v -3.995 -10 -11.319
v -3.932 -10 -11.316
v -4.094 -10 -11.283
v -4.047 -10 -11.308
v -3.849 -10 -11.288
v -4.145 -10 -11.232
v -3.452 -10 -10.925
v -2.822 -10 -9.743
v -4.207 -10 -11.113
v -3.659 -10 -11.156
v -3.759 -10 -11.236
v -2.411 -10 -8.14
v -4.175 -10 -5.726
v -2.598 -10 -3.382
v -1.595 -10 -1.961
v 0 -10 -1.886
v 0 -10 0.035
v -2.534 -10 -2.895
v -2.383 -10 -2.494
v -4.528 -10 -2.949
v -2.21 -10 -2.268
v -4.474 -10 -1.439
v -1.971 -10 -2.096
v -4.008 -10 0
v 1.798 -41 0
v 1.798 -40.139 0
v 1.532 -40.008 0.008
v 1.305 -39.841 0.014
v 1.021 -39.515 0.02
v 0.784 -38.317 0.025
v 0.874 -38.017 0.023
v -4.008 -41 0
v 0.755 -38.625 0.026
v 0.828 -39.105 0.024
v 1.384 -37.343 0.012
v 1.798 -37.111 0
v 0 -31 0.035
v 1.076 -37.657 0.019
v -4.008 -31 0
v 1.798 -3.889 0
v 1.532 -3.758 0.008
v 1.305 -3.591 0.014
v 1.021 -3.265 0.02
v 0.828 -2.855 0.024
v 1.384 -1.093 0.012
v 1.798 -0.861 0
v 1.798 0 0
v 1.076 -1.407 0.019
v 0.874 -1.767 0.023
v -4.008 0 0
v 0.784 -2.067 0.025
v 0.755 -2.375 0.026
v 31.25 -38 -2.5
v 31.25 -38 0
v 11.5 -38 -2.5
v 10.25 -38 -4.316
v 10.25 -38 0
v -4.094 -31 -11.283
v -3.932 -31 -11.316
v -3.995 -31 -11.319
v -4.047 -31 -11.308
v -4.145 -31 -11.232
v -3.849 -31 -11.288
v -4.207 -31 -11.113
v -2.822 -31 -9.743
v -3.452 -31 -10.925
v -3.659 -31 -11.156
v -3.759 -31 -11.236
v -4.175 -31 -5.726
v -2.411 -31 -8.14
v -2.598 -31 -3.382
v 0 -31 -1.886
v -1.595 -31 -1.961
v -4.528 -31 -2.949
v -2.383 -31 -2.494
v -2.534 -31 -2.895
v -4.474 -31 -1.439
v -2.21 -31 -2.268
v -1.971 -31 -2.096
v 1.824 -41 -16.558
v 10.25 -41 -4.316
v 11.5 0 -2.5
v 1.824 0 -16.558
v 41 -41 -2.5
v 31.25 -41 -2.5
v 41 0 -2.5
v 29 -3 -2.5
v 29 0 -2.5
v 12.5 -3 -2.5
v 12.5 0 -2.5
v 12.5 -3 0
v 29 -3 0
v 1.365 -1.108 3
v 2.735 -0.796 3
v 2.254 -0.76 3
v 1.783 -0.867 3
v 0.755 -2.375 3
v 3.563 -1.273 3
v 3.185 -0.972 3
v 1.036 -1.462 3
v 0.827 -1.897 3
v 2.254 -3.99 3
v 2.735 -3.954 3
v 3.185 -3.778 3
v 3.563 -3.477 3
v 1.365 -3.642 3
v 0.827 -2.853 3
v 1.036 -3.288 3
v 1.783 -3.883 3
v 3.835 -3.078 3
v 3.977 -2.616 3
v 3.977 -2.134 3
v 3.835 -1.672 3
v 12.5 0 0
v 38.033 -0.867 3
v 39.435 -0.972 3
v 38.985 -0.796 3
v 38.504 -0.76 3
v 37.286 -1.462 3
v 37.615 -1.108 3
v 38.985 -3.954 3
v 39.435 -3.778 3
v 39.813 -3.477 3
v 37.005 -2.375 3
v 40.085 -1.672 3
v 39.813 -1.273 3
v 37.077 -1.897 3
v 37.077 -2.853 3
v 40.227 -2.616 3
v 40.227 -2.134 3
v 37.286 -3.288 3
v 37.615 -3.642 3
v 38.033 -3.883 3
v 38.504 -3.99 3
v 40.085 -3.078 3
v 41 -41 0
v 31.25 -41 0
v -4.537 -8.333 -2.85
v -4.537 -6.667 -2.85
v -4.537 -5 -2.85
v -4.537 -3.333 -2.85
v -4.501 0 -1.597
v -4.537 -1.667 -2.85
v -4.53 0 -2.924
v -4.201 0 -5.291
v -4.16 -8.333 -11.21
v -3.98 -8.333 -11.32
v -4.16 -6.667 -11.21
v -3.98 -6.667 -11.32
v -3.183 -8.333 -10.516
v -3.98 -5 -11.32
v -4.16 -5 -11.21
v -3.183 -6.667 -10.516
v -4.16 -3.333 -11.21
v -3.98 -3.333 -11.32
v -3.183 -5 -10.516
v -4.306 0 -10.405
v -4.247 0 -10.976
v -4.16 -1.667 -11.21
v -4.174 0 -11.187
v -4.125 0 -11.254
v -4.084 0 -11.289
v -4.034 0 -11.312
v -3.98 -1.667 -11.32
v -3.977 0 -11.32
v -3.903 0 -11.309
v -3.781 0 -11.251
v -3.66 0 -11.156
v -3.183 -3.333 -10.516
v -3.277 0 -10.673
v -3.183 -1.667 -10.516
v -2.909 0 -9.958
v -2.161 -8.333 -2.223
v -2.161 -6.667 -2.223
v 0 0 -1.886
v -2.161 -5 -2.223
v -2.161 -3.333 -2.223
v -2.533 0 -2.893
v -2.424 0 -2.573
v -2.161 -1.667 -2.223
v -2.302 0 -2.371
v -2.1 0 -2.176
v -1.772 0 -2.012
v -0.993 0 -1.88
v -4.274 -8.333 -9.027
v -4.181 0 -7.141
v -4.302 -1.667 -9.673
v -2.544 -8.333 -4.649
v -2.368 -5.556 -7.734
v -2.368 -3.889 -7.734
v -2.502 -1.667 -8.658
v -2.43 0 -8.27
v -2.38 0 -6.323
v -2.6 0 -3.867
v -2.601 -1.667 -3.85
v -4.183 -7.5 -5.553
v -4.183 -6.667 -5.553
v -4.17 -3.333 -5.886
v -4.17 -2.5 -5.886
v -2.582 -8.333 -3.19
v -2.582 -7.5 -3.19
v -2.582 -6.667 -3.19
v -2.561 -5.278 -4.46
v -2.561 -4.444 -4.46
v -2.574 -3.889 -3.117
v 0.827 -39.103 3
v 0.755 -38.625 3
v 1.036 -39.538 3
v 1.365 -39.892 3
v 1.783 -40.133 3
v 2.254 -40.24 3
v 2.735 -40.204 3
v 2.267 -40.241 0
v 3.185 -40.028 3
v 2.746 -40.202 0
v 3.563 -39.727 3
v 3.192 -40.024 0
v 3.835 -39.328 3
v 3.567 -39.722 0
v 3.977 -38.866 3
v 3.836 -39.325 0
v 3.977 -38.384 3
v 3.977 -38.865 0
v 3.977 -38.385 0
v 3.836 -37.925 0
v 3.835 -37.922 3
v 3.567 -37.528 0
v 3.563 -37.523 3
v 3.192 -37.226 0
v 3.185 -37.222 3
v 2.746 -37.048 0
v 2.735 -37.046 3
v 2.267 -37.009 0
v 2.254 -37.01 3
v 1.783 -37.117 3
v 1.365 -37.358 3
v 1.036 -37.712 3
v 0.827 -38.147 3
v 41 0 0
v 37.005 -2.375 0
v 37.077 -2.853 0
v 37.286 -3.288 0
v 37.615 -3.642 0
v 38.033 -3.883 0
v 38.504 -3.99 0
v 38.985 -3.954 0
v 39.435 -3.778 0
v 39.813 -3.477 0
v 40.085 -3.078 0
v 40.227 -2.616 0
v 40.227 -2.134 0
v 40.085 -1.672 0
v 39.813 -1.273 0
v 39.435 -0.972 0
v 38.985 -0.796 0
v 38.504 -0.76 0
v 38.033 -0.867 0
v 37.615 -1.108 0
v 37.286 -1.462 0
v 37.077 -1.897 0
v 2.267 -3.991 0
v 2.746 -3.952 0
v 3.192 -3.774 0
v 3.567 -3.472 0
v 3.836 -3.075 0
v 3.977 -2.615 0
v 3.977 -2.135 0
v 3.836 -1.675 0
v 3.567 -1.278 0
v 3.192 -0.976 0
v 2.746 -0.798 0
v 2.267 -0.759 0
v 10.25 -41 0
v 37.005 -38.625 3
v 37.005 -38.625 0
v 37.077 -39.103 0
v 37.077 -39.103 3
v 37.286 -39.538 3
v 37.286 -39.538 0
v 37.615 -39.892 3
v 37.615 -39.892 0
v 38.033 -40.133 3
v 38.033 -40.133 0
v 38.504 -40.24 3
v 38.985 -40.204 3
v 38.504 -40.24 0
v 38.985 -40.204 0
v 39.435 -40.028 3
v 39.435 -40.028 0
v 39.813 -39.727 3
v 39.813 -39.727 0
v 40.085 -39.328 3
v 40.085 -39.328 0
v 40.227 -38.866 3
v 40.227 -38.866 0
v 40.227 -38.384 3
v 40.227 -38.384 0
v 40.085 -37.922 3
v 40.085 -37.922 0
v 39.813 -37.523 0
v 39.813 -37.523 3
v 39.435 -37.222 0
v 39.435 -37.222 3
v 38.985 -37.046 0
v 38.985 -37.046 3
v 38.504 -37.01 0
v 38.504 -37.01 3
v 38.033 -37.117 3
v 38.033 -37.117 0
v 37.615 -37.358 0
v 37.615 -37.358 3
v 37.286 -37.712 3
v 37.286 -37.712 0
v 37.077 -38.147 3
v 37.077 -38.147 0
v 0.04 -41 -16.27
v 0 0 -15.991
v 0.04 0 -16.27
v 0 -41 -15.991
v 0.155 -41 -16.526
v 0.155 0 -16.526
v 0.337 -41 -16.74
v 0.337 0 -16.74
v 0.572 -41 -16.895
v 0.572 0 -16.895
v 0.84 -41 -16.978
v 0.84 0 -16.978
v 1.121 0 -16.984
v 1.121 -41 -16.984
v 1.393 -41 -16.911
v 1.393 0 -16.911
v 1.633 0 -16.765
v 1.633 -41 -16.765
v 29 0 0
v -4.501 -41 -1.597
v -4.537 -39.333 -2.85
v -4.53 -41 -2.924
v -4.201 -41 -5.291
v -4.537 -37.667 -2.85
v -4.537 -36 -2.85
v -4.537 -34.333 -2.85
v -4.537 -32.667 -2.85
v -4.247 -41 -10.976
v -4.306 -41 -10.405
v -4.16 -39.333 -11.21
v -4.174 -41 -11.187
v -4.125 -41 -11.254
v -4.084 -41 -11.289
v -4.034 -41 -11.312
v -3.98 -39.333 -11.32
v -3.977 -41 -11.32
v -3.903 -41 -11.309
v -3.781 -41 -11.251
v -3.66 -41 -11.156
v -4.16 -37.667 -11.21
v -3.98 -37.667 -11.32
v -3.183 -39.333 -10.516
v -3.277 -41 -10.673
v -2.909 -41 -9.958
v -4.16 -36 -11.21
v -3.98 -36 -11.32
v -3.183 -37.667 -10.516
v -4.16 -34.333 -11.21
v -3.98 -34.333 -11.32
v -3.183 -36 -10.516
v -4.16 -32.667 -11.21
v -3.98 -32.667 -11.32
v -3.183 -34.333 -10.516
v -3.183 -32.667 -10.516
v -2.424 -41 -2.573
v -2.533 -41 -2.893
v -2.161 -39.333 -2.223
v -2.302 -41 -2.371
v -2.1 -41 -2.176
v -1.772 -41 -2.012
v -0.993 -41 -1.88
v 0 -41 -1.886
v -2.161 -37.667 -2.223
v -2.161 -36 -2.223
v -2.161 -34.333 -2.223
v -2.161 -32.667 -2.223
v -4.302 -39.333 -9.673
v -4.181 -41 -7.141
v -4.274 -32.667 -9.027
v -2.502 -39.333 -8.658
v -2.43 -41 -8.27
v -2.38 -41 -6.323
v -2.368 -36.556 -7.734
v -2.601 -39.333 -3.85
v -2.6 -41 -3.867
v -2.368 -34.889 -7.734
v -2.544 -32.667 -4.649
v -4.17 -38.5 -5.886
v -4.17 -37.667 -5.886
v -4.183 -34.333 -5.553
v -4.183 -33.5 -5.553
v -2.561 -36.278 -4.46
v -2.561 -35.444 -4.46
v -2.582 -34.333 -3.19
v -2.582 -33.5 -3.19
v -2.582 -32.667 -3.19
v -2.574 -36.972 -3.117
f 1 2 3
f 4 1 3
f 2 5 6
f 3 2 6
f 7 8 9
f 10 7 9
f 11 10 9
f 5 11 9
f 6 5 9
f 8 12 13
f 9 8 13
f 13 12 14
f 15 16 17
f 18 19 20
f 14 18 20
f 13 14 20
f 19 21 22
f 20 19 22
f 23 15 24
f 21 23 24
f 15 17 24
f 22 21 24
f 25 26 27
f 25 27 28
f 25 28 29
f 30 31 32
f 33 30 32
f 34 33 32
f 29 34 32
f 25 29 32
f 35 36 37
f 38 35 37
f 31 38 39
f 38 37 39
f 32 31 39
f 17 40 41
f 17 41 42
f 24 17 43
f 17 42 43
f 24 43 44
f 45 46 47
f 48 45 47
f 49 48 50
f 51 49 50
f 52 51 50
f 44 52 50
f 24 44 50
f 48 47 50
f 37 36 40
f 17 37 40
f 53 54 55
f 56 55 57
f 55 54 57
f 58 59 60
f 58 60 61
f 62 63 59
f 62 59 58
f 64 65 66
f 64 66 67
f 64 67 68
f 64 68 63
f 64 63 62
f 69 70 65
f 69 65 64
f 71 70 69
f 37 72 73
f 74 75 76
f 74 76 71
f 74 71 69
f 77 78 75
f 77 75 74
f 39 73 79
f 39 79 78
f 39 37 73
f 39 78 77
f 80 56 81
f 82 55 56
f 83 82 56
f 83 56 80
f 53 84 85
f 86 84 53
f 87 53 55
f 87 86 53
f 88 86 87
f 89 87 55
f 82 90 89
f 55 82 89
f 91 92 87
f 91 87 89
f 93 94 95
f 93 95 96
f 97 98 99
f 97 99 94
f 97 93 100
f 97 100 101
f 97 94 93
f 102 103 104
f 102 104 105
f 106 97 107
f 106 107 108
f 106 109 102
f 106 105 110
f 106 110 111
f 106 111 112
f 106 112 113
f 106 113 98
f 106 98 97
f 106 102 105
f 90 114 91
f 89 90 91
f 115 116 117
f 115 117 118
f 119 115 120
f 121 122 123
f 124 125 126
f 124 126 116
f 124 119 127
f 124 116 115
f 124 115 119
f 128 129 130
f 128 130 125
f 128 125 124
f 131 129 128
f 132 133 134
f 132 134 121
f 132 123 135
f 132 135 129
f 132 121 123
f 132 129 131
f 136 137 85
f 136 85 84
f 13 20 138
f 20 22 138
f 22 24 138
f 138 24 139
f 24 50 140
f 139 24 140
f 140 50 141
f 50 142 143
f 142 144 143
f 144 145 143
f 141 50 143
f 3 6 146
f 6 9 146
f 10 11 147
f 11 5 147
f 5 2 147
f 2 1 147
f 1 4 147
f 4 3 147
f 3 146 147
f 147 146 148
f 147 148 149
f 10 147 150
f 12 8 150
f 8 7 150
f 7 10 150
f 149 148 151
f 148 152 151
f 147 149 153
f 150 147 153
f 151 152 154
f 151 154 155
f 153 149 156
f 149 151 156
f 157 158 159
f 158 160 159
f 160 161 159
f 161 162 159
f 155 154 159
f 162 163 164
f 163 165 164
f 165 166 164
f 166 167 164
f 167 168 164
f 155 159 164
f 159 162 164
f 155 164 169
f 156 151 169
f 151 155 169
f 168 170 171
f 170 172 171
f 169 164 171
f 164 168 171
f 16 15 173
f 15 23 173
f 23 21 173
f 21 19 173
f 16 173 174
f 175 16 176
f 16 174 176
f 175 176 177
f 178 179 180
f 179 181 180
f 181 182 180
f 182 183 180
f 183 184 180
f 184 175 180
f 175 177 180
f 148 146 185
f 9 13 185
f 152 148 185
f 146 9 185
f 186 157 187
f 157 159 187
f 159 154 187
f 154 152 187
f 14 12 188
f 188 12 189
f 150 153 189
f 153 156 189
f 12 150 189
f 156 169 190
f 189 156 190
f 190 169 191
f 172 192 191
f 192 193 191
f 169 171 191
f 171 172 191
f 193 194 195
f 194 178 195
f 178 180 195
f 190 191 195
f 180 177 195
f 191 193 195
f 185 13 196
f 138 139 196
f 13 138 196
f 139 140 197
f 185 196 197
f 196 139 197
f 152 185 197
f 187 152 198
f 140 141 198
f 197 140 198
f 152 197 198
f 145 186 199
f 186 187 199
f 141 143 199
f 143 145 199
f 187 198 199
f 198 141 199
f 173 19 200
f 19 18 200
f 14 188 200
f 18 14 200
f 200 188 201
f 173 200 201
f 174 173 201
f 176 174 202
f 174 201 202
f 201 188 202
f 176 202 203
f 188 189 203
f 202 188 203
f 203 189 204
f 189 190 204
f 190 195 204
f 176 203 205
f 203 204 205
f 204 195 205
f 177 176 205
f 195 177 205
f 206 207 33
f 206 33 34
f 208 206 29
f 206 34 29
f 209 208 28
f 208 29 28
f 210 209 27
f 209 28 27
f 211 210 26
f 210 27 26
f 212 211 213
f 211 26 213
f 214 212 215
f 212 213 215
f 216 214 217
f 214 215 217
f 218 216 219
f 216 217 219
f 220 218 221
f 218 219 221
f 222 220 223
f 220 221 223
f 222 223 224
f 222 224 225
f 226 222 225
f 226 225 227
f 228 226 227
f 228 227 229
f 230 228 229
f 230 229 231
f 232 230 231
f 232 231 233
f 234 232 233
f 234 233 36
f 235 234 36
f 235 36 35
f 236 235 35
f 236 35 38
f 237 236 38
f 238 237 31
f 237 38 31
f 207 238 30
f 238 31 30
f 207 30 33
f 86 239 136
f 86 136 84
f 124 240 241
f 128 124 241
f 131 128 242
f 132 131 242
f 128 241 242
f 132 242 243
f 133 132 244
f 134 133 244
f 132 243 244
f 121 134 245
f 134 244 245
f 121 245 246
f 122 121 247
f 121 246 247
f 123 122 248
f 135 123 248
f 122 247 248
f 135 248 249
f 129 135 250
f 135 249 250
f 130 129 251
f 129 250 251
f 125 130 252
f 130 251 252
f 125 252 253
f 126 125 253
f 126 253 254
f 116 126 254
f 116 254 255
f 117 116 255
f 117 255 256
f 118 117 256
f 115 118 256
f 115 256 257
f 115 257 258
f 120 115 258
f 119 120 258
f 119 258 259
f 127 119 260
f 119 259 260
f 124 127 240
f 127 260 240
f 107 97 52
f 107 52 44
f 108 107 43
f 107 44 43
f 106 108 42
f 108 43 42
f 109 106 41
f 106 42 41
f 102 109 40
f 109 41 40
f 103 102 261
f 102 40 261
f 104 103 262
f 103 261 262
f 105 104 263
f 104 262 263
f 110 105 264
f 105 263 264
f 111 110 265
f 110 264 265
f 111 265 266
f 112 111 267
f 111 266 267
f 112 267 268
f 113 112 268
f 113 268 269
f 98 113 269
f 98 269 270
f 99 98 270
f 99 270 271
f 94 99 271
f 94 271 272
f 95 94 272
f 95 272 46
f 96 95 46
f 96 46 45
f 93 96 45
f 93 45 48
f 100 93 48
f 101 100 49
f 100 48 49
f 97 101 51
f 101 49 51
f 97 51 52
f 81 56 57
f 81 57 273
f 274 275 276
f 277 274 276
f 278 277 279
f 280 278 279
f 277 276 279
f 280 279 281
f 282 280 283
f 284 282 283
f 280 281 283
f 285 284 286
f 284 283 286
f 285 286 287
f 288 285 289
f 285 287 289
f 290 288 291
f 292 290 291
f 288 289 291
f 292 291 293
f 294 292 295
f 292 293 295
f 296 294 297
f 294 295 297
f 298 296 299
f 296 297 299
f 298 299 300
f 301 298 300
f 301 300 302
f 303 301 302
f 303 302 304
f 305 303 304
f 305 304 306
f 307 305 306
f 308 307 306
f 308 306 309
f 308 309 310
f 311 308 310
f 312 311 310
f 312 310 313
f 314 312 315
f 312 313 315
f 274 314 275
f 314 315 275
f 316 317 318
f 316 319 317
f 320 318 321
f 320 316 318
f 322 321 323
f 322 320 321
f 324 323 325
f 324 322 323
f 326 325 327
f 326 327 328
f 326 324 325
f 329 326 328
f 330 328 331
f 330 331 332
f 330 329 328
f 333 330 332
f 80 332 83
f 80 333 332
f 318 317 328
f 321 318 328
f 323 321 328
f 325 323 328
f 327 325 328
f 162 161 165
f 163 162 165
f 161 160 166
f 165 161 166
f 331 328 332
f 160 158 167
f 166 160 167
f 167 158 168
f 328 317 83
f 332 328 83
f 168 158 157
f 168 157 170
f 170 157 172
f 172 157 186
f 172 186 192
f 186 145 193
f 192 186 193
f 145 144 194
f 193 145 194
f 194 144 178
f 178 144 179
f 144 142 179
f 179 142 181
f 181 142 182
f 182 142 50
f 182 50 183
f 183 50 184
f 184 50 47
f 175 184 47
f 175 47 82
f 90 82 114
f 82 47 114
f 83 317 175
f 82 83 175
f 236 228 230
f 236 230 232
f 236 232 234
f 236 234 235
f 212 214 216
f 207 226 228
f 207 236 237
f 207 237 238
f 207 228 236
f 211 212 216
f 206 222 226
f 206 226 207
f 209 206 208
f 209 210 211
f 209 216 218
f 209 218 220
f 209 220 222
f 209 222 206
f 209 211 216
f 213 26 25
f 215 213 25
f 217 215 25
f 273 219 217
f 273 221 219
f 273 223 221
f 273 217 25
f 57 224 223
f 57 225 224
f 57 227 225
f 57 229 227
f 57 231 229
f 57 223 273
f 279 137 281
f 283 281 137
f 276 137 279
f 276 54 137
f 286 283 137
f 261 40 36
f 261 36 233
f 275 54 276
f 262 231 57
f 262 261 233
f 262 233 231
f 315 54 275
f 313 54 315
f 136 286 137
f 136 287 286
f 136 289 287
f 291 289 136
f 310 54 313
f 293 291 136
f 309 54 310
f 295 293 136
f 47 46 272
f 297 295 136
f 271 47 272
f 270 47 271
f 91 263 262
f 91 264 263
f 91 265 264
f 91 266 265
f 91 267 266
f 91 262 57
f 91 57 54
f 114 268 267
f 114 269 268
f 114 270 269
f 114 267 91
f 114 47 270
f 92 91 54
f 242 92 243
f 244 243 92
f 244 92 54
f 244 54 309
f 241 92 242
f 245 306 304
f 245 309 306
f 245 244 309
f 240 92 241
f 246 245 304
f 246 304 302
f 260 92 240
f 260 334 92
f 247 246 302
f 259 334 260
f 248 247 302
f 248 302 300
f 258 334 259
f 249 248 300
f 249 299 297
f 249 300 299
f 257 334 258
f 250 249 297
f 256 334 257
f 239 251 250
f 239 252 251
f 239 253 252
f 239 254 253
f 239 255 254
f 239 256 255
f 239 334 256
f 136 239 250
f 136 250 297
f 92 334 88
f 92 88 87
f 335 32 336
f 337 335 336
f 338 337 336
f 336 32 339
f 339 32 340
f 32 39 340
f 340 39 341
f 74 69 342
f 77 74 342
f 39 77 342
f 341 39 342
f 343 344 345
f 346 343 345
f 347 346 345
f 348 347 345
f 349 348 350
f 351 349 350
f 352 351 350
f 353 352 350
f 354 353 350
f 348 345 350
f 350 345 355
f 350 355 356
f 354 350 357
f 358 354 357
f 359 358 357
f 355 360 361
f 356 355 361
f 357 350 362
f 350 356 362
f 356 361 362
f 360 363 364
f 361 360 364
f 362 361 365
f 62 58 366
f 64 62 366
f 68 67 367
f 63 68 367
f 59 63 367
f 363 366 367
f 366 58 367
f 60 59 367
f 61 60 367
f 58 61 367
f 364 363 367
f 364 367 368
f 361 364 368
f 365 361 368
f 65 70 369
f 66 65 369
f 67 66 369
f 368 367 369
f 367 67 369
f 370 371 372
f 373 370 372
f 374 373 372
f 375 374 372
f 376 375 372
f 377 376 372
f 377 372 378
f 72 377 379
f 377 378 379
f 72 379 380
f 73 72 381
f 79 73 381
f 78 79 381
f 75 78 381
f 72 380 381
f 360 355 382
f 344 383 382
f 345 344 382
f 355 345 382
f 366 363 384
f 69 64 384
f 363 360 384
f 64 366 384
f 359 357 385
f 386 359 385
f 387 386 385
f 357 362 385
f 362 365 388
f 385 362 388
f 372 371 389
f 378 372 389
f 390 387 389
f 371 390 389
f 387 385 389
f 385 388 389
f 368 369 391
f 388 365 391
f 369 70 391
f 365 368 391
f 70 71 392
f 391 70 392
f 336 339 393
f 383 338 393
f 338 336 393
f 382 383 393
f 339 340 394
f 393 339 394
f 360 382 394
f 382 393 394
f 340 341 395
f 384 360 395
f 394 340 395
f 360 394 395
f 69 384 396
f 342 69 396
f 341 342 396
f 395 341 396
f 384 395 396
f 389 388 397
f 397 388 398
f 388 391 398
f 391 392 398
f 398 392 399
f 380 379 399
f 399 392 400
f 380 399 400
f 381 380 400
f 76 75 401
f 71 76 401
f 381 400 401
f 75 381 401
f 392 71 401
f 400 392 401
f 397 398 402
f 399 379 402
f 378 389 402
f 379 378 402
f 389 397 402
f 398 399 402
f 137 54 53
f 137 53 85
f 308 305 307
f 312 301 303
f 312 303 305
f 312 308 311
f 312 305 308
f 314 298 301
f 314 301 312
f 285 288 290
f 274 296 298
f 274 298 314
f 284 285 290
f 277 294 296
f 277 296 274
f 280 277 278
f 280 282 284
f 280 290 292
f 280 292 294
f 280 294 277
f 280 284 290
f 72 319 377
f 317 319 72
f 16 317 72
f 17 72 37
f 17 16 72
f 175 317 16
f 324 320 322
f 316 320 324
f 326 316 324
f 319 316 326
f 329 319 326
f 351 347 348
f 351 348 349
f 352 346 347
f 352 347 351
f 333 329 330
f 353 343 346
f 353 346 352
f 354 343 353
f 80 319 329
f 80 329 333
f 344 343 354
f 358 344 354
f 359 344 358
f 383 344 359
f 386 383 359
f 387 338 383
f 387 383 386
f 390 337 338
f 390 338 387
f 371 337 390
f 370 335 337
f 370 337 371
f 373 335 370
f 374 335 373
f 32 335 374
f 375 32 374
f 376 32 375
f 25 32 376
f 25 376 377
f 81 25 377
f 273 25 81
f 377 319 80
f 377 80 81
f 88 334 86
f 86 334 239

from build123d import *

# Parameters (mm, degrees)
PAD_DEPTH         = 41
PAD001_DEPTH      = 41
FILLET_R          = 1
SKETCH002_W       = 10
SKETCH002_H       = 21
POCKET_DEPTH      = 17
POCKET_DEPTH_BACK = -10
SKETCH003_R       = 1.62
PAD002_DEPTH      = 3
SKETCH004_W       = 21
SKETCH004_H       = 5
SKETCH004_W_2     = 16.5
POCKET001_DEPTH   = 5


with BuildPart() as part:
    # Sketch001 → Pad (new body)
    with BuildSketch(Plane.XZ):
        Polygon((0, 0), (41, 0), (41, -2.5), (11.499851, -2.5), (0, -19.207876), align=None)
    extrude(amount=PAD_DEPTH)

    # Sketch → Pad001 (join)
    with BuildSketch(Plane.XZ):
        with BuildLine():
            add(Edge.make_bspline(
                [(-4.007935, 0), (-5.052523, -2.341822), (-3.57605, -4.512058), (-5.023903, -13.674), (-1.288251, -8.052732), (-4.03214, -0.520727), (4.450398, -3.204271), (10.126076, 0.320226), (-4.007935, 0)],
                knots=[0, 0, 0, 0, 0.166667, 0.333333, 0.5, 0.666667, 0.833333, 1, 1, 1, 1], degree=3))
        make_face()
    extrude(amount=PAD001_DEPTH)

    # Fillet
    fillet_edges = [part.edges().sort_by_distance(p)[0] for p in [
        (0, -20.5, -19.207876),
    ]]
    fillet(fillet_edges, radius=FILLET_R)

    # Sketch002 (on Face6 of Fillet) → Pocket (cut, two sides)
    with BuildSketch(Plane(origin=(0, 0, 0), x_dir=(-1, 0, 0), z_dir=(0, 0, 1))) as pocket_sk:
        with Locations((5, 20.5)):
            Rectangle(SKETCH002_W, SKETCH002_H)
    extrude(amount=-POCKET_DEPTH, mode=Mode.SUBTRACT)
    extrude(pocket_sk.sketch, amount=-POCKET_DEPTH_BACK, mode=Mode.SUBTRACT)

    # Sketch003 (on Face6 of Pocket) → Pad002 (join)
    with BuildSketch(Plane(origin=(0, 0, 0), x_dir=(-1, 0, 0), z_dir=(0, 0, 1))):
        with Locations((-2.375, 2.375)):
            Circle(SKETCH003_R)
        with Locations((-38.625, 38.625)):
            Circle(SKETCH003_R)
        with Locations((-38.625, 2.375)):
            Circle(SKETCH003_R)
        with Locations((-2.375, 38.625)):
            Circle(SKETCH003_R)
    extrude(amount=PAD002_DEPTH)

    # Sketch004 (on Face6 of Pad002) → Pocket001 (cut)
    with BuildSketch(Plane(origin=(0, 0, 0), x_dir=(-1, 0, 0), z_dir=(0, 0, 1))):
        with Locations((-20.75, 40.5)):
            Rectangle(SKETCH004_W, SKETCH004_H)
        with Locations((-20.75, 0.5)):
            Rectangle(SKETCH004_W_2, SKETCH004_H)
    extrude(amount=-POCKET001_DEPTH, mode=Mode.SUBTRACT)


solid = part.part
